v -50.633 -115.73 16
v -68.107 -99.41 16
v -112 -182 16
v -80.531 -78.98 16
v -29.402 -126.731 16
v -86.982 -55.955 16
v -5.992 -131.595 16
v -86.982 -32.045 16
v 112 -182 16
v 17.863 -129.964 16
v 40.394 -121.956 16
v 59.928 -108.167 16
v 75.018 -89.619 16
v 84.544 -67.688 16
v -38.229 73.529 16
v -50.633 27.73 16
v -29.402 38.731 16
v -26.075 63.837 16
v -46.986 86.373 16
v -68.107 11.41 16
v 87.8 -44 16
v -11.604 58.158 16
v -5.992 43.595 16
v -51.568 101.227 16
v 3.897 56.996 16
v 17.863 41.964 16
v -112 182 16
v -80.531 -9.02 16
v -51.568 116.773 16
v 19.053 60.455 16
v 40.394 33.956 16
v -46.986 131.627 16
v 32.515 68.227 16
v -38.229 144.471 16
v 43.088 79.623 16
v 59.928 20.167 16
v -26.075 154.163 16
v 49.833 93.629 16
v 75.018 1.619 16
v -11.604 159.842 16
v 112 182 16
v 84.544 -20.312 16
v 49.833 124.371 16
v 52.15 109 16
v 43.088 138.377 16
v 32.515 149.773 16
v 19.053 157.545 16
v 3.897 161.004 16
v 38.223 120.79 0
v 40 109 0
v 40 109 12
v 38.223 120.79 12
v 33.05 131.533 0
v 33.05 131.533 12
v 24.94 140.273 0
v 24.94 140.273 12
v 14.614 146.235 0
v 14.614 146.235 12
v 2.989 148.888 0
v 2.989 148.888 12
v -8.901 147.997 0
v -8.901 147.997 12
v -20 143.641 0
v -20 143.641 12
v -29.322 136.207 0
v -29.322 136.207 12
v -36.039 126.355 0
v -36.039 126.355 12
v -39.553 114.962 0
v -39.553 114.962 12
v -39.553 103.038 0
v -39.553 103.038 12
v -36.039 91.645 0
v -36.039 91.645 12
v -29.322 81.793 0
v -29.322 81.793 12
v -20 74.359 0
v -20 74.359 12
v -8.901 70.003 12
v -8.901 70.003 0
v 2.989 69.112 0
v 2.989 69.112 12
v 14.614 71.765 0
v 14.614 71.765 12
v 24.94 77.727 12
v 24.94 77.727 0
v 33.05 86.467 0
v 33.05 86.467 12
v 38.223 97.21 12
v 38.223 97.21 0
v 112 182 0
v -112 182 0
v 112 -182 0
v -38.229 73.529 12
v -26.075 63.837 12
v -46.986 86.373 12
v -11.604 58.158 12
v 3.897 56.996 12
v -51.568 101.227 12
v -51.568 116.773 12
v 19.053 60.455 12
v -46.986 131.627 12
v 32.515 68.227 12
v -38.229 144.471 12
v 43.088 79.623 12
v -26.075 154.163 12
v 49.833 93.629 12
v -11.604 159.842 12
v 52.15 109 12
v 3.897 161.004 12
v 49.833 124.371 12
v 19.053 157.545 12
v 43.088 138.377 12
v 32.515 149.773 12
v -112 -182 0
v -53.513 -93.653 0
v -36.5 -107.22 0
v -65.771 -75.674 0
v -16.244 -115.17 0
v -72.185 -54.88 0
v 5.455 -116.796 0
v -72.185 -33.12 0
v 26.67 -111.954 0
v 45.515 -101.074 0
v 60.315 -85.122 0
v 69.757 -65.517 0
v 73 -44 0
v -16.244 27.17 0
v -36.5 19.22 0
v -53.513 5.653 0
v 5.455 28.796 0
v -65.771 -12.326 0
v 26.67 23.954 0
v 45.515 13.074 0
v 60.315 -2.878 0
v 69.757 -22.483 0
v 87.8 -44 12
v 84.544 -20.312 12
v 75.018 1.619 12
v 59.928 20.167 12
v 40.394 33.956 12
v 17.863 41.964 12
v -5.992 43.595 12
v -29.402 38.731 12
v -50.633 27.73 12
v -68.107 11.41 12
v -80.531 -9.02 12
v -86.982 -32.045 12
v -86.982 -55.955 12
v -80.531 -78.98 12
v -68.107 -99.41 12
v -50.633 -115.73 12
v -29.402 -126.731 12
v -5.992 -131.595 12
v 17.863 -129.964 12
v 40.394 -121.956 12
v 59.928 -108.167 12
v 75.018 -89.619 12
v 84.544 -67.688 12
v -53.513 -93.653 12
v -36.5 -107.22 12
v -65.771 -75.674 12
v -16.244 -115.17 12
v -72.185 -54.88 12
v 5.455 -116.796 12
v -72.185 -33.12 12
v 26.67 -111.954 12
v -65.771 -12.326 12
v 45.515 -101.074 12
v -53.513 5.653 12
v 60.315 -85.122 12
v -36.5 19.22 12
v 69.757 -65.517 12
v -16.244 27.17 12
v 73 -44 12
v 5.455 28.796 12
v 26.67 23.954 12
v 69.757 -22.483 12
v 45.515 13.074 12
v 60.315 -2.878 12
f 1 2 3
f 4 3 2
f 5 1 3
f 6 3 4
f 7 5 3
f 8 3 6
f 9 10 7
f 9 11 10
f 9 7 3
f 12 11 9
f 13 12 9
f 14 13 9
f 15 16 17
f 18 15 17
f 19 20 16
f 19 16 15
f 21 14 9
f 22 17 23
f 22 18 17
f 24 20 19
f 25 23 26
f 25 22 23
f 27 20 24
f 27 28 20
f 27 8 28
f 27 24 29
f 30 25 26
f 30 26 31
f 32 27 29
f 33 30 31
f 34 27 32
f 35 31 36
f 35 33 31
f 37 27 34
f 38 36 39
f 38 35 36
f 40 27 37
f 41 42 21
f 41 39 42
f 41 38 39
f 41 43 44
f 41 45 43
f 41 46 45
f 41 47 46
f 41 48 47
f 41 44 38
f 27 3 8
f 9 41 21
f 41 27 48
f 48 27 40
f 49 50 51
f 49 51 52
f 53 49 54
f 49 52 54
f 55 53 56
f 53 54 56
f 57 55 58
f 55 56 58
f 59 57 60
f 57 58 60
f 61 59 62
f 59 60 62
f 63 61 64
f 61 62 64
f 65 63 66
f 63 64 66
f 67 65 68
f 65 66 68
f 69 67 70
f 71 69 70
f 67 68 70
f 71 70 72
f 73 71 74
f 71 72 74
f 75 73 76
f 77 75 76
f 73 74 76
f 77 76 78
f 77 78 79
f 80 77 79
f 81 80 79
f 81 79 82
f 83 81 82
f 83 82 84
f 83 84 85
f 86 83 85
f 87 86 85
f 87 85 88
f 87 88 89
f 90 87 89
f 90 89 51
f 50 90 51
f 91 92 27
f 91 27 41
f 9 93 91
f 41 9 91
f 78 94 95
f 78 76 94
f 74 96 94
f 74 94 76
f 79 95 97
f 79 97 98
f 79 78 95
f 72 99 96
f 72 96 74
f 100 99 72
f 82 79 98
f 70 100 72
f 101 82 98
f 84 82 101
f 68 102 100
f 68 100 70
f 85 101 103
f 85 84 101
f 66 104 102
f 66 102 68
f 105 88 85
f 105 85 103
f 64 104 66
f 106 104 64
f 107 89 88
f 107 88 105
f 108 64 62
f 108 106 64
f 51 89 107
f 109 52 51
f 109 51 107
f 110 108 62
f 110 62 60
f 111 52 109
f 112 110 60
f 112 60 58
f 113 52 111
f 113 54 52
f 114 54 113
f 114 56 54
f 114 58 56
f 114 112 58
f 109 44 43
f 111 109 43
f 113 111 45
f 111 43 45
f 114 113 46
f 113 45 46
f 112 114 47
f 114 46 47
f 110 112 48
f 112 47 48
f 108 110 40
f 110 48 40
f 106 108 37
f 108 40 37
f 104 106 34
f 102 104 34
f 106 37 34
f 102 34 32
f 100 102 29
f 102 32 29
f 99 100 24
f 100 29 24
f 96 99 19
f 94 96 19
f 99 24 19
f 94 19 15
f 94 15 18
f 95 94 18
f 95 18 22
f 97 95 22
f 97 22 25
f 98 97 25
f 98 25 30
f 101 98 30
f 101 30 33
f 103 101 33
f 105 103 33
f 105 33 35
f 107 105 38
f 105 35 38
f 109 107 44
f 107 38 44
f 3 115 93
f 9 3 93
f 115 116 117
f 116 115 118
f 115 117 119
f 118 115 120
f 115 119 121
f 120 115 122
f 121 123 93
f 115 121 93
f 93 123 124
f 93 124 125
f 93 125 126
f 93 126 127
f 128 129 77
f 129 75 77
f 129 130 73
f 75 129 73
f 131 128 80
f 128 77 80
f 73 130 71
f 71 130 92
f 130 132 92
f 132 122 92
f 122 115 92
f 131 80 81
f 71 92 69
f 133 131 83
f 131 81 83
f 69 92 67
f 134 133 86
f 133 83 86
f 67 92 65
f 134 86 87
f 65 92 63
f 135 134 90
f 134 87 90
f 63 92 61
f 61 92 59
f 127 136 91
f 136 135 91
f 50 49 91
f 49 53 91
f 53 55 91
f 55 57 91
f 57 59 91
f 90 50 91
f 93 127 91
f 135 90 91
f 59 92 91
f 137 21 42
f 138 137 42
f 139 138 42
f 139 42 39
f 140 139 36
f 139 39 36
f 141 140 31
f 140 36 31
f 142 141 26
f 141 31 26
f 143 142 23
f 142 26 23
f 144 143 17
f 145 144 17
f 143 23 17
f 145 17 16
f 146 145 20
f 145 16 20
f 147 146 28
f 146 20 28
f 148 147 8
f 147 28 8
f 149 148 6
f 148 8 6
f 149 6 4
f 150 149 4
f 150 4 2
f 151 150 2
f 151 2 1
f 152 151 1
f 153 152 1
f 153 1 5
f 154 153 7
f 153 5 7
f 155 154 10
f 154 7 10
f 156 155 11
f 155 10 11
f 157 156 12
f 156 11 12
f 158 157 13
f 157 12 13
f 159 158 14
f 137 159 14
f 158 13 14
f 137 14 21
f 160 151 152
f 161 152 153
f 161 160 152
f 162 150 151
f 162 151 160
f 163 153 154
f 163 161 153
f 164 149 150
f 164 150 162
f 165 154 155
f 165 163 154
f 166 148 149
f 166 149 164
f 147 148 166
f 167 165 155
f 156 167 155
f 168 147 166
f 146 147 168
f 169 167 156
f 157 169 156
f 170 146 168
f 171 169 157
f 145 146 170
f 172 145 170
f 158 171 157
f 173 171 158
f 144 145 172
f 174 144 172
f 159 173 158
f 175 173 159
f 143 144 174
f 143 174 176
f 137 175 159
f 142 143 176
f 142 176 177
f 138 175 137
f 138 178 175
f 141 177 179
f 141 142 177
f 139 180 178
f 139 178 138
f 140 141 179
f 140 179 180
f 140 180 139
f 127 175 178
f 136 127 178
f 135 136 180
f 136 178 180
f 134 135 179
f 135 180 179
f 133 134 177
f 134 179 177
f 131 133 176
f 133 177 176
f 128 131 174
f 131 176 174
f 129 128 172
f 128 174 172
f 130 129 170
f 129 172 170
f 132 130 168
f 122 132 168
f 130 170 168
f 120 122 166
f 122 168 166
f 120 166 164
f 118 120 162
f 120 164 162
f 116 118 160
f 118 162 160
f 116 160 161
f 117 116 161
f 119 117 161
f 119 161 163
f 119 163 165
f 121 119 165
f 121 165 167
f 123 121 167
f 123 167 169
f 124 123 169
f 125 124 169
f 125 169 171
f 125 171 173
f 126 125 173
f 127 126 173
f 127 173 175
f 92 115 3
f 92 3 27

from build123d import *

# Parameters (mm, degrees)
SKETCH1_W           = 224
SKETCH1_H           = 364
BOSS_EXTRUDE1_DEPTH = 16
SKETCH2_R           = 52.15
SKETCH2_R_2         = 87.8
CUT_EXTRUDE1_DEPTH  = 4
SKETCH3_R           = 40
SKETCH3_R_2         = 73
CUT_EXTRUDE2_DEPTH  = 17


with BuildPart() as part:
    # Sketch1 → Boss-Extrude1 (new body)
    with BuildSketch(Plane.XY):
        Rectangle(SKETCH1_W, SKETCH1_H)
    extrude(amount=BOSS_EXTRUDE1_DEPTH)

    # Sketch2 → Cut-Extrude1 (cut)
    with BuildSketch(Plane.XY.offset(16)):
        with Locations((0, 109)):
            Circle(SKETCH2_R)
        with Locations((0, -44)):
            Circle(SKETCH2_R_2)
    extrude(amount=-CUT_EXTRUDE1_DEPTH, mode=Mode.SUBTRACT)

    # Sketch3 → Cut-Extrude2 (cut, through all)
    with BuildSketch(Plane.XY.offset(16)):
        with Locations((0, 109)):
            Circle(SKETCH3_R)
        with Locations((0, -44)):
            Circle(SKETCH3_R_2)
    extrude(amount=-CUT_EXTRUDE2_DEPTH, mode=Mode.SUBTRACT)


solid = part.part
